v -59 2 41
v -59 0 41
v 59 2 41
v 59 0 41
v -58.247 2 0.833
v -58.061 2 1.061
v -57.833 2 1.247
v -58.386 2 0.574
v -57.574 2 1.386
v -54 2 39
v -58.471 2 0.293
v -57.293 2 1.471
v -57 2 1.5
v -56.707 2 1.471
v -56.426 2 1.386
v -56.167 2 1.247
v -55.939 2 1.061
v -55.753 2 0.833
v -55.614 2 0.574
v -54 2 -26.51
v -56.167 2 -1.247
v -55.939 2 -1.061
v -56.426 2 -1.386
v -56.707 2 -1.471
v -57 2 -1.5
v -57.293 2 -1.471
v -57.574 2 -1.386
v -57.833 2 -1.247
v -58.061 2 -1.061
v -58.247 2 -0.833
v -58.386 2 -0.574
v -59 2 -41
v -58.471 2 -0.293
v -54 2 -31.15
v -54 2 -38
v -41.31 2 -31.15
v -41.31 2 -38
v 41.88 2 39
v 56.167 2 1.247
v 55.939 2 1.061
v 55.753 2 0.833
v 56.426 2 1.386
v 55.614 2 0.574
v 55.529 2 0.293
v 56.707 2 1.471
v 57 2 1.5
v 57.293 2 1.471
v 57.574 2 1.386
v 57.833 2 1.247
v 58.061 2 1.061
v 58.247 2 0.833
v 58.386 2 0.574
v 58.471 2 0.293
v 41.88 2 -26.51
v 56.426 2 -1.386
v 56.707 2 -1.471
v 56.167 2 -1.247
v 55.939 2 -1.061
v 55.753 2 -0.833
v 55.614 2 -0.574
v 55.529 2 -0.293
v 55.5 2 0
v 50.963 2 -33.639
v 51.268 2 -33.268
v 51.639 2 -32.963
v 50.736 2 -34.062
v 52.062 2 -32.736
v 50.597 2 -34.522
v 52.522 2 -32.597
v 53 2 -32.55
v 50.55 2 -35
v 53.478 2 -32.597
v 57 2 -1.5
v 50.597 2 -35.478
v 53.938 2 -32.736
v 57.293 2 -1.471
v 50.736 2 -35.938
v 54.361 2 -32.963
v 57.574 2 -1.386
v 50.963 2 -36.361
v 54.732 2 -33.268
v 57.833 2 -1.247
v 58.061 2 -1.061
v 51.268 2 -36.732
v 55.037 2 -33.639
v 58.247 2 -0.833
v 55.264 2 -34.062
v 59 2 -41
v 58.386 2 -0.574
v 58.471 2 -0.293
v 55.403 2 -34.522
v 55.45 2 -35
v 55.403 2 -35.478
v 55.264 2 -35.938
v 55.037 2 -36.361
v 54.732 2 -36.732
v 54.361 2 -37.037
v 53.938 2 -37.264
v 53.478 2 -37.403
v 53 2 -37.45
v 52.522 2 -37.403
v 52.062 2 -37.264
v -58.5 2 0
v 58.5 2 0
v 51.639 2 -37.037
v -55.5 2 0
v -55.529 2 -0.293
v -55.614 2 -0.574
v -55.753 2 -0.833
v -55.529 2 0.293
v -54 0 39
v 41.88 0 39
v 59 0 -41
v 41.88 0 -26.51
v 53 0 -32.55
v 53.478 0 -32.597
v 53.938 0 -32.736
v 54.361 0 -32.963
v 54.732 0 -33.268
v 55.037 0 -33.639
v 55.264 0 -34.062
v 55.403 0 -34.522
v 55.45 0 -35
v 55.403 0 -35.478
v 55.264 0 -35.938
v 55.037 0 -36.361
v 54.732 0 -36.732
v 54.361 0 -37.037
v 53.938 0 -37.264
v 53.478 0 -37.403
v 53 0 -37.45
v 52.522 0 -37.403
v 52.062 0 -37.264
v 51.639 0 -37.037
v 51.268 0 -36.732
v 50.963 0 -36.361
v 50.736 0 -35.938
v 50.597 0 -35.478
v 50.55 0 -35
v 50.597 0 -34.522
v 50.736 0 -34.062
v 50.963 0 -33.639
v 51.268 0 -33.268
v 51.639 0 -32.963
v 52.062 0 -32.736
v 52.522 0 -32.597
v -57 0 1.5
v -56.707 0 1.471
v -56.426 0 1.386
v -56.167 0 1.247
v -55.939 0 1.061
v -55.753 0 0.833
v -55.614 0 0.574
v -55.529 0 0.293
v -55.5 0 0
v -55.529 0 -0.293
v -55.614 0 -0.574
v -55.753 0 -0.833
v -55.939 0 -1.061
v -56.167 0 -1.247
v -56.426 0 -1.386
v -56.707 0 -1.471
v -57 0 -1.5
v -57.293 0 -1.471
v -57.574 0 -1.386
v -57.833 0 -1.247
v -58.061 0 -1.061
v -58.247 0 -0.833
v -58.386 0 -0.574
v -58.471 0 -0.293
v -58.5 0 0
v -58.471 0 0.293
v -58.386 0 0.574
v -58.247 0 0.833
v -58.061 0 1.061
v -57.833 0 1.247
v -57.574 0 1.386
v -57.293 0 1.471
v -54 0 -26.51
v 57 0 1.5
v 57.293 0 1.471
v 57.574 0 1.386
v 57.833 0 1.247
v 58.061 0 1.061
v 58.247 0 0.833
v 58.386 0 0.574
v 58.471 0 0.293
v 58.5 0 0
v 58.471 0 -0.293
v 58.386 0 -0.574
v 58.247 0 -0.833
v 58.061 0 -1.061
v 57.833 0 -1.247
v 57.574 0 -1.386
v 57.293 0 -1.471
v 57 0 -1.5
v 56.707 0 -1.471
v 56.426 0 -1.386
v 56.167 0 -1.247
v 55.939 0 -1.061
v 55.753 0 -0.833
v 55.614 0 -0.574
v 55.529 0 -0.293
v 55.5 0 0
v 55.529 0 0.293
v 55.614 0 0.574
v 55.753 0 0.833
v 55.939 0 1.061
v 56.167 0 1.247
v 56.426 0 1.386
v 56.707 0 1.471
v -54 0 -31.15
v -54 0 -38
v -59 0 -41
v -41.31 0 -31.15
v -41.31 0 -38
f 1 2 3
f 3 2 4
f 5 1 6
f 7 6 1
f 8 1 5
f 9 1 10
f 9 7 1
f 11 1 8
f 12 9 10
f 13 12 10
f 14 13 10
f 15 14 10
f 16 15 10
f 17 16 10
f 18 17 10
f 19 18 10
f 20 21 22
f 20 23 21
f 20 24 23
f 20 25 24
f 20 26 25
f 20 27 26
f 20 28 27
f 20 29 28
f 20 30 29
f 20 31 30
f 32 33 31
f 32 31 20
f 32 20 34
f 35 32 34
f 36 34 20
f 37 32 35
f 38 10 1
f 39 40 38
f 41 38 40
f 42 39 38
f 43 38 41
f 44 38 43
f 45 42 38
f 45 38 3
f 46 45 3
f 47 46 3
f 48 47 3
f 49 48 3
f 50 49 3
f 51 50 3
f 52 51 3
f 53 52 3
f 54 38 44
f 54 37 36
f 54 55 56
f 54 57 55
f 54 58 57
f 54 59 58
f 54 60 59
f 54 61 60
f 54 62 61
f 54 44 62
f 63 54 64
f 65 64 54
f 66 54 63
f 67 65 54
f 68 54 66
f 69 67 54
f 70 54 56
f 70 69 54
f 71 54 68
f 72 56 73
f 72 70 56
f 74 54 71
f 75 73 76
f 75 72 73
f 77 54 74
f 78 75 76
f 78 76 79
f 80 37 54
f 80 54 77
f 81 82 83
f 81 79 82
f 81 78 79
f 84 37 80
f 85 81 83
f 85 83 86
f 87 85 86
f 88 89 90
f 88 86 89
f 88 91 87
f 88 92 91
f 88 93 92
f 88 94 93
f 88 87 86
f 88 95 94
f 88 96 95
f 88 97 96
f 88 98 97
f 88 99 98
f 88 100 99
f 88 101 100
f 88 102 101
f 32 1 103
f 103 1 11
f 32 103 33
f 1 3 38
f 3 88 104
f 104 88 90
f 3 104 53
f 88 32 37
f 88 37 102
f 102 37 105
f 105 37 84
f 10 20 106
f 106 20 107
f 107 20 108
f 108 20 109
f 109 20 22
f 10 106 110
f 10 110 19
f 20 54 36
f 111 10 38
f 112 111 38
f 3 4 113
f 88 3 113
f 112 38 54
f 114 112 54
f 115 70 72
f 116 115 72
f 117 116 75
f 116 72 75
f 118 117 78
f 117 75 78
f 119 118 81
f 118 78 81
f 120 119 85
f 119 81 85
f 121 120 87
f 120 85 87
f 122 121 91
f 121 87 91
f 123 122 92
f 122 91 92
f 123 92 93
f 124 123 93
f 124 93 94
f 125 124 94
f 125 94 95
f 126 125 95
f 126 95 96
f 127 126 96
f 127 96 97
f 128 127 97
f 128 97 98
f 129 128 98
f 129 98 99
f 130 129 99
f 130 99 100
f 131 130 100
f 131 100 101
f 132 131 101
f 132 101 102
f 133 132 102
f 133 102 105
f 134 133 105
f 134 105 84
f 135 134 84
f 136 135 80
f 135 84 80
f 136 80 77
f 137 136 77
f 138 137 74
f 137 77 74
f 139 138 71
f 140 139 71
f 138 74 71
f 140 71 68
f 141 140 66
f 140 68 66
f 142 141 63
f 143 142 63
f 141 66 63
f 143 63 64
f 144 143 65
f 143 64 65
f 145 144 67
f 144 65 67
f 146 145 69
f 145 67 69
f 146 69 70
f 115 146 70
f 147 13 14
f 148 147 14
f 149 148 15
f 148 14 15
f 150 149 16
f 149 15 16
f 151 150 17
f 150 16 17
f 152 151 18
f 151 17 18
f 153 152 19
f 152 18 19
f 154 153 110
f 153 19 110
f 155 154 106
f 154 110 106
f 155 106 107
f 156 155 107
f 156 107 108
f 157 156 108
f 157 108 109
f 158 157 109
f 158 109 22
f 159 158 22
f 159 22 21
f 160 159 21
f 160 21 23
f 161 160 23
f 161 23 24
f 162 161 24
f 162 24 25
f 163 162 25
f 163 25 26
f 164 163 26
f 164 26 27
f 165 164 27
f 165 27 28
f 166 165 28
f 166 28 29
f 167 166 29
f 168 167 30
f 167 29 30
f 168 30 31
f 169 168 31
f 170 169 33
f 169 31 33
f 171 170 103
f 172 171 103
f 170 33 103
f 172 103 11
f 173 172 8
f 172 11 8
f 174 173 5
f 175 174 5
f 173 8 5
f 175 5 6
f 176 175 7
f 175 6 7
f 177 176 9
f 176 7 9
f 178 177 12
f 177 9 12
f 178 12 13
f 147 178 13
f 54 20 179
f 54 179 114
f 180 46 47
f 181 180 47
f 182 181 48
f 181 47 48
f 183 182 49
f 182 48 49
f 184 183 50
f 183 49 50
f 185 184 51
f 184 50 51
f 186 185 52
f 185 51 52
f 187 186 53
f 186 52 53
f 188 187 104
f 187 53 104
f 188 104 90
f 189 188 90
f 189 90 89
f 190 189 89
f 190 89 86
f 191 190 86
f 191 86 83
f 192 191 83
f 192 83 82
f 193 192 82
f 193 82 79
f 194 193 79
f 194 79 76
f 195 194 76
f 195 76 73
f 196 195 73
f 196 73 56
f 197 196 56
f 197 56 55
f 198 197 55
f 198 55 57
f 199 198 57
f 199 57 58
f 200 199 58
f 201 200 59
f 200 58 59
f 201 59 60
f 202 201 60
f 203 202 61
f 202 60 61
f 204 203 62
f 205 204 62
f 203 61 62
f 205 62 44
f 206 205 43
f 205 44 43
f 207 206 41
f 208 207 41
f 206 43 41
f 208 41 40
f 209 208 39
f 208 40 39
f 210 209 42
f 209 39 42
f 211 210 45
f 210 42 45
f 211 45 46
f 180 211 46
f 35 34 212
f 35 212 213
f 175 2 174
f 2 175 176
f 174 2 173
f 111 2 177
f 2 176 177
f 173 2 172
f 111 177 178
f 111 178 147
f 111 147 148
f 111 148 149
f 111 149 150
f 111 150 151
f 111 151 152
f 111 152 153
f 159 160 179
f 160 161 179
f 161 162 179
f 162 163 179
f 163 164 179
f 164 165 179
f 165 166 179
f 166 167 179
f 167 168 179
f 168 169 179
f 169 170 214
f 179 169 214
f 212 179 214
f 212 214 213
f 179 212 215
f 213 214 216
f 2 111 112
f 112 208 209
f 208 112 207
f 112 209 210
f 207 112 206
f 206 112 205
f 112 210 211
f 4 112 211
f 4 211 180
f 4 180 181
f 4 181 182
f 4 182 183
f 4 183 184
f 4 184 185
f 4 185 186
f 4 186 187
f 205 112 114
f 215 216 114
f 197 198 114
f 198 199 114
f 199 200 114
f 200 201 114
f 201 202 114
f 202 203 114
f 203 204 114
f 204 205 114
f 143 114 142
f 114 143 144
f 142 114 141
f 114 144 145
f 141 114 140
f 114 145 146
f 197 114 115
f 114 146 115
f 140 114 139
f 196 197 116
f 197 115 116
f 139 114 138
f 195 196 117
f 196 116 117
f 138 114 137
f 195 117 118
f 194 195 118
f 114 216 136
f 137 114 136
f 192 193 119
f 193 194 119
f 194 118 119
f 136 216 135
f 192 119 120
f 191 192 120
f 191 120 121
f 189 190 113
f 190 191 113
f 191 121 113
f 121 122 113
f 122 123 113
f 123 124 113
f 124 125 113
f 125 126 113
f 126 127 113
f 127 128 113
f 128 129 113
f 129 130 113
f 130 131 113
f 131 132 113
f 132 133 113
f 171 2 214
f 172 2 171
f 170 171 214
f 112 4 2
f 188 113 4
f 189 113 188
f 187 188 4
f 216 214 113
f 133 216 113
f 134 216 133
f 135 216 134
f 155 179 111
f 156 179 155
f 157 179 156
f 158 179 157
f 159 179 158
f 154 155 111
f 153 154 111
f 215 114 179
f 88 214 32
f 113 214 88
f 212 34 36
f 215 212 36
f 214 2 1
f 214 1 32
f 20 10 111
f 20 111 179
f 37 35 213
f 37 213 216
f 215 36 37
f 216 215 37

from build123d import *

# Parameters (mm, degrees)
SKETCH1_W           = 118
SKETCH1_H           = 82
BOSS_EXTRUDE1_DEPTH = 2
SKETCH2_R           = 2.45
SKETCH2_W           = 95.88
SKETCH2_H           = 65.51
SKETCH2_W_2         = 12.69
SKETCH2_H_2         = 6.85
CUT_EXTRUDE4_DEPTH  = 10
SKETCH3_R           = 1.5
CUT_EXTRUDE7_DEPTH  = 10


with BuildPart() as part:
    # Sketch1 → Boss-Extrude1 (new body)
    with BuildSketch(Plane(origin=(0, 0, 0), x_dir=(1, 0, 0), z_dir=(0, 1, 0))):
        Rectangle(SKETCH1_W, SKETCH1_H)
    extrude(amount=BOSS_EXTRUDE1_DEPTH)

    # Sketch2 → Cut-Extrude4 (cut)
    with BuildSketch(Plane(origin=(0, 2, 0), x_dir=(1, 0, 0), z_dir=(0, 1, 0))):
        with Locations(Location((53, 35, 0), (0, 0, 270))):
            Circle(SKETCH2_R)
        with Locations((-6.06, -6.245)):
            Rectangle(SKETCH2_W, SKETCH2_H)
        with Locations((-47.655, 34.575)):
            Rectangle(SKETCH2_W_2, SKETCH2_H_2)
    extrude(amount=-CUT_EXTRUDE4_DEPTH, mode=Mode.SUBTRACT)

    # Sketch3 → Cut-Extrude7 (cut)
    with BuildSketch(Plane(origin=(0, 2, 0), x_dir=(1, 0, 0), z_dir=(0, 1, 0))):
        with Locations(Location((57, 0, 0), (0, 0, 270))):
            Circle(SKETCH3_R)
        with Locations(Location((-57, 0, 0), (0, 0, 270))):
            Circle(SKETCH3_R)
    extrude(amount=-CUT_EXTRUDE7_DEPTH, mode=Mode.SUBTRACT)


solid = part.part
